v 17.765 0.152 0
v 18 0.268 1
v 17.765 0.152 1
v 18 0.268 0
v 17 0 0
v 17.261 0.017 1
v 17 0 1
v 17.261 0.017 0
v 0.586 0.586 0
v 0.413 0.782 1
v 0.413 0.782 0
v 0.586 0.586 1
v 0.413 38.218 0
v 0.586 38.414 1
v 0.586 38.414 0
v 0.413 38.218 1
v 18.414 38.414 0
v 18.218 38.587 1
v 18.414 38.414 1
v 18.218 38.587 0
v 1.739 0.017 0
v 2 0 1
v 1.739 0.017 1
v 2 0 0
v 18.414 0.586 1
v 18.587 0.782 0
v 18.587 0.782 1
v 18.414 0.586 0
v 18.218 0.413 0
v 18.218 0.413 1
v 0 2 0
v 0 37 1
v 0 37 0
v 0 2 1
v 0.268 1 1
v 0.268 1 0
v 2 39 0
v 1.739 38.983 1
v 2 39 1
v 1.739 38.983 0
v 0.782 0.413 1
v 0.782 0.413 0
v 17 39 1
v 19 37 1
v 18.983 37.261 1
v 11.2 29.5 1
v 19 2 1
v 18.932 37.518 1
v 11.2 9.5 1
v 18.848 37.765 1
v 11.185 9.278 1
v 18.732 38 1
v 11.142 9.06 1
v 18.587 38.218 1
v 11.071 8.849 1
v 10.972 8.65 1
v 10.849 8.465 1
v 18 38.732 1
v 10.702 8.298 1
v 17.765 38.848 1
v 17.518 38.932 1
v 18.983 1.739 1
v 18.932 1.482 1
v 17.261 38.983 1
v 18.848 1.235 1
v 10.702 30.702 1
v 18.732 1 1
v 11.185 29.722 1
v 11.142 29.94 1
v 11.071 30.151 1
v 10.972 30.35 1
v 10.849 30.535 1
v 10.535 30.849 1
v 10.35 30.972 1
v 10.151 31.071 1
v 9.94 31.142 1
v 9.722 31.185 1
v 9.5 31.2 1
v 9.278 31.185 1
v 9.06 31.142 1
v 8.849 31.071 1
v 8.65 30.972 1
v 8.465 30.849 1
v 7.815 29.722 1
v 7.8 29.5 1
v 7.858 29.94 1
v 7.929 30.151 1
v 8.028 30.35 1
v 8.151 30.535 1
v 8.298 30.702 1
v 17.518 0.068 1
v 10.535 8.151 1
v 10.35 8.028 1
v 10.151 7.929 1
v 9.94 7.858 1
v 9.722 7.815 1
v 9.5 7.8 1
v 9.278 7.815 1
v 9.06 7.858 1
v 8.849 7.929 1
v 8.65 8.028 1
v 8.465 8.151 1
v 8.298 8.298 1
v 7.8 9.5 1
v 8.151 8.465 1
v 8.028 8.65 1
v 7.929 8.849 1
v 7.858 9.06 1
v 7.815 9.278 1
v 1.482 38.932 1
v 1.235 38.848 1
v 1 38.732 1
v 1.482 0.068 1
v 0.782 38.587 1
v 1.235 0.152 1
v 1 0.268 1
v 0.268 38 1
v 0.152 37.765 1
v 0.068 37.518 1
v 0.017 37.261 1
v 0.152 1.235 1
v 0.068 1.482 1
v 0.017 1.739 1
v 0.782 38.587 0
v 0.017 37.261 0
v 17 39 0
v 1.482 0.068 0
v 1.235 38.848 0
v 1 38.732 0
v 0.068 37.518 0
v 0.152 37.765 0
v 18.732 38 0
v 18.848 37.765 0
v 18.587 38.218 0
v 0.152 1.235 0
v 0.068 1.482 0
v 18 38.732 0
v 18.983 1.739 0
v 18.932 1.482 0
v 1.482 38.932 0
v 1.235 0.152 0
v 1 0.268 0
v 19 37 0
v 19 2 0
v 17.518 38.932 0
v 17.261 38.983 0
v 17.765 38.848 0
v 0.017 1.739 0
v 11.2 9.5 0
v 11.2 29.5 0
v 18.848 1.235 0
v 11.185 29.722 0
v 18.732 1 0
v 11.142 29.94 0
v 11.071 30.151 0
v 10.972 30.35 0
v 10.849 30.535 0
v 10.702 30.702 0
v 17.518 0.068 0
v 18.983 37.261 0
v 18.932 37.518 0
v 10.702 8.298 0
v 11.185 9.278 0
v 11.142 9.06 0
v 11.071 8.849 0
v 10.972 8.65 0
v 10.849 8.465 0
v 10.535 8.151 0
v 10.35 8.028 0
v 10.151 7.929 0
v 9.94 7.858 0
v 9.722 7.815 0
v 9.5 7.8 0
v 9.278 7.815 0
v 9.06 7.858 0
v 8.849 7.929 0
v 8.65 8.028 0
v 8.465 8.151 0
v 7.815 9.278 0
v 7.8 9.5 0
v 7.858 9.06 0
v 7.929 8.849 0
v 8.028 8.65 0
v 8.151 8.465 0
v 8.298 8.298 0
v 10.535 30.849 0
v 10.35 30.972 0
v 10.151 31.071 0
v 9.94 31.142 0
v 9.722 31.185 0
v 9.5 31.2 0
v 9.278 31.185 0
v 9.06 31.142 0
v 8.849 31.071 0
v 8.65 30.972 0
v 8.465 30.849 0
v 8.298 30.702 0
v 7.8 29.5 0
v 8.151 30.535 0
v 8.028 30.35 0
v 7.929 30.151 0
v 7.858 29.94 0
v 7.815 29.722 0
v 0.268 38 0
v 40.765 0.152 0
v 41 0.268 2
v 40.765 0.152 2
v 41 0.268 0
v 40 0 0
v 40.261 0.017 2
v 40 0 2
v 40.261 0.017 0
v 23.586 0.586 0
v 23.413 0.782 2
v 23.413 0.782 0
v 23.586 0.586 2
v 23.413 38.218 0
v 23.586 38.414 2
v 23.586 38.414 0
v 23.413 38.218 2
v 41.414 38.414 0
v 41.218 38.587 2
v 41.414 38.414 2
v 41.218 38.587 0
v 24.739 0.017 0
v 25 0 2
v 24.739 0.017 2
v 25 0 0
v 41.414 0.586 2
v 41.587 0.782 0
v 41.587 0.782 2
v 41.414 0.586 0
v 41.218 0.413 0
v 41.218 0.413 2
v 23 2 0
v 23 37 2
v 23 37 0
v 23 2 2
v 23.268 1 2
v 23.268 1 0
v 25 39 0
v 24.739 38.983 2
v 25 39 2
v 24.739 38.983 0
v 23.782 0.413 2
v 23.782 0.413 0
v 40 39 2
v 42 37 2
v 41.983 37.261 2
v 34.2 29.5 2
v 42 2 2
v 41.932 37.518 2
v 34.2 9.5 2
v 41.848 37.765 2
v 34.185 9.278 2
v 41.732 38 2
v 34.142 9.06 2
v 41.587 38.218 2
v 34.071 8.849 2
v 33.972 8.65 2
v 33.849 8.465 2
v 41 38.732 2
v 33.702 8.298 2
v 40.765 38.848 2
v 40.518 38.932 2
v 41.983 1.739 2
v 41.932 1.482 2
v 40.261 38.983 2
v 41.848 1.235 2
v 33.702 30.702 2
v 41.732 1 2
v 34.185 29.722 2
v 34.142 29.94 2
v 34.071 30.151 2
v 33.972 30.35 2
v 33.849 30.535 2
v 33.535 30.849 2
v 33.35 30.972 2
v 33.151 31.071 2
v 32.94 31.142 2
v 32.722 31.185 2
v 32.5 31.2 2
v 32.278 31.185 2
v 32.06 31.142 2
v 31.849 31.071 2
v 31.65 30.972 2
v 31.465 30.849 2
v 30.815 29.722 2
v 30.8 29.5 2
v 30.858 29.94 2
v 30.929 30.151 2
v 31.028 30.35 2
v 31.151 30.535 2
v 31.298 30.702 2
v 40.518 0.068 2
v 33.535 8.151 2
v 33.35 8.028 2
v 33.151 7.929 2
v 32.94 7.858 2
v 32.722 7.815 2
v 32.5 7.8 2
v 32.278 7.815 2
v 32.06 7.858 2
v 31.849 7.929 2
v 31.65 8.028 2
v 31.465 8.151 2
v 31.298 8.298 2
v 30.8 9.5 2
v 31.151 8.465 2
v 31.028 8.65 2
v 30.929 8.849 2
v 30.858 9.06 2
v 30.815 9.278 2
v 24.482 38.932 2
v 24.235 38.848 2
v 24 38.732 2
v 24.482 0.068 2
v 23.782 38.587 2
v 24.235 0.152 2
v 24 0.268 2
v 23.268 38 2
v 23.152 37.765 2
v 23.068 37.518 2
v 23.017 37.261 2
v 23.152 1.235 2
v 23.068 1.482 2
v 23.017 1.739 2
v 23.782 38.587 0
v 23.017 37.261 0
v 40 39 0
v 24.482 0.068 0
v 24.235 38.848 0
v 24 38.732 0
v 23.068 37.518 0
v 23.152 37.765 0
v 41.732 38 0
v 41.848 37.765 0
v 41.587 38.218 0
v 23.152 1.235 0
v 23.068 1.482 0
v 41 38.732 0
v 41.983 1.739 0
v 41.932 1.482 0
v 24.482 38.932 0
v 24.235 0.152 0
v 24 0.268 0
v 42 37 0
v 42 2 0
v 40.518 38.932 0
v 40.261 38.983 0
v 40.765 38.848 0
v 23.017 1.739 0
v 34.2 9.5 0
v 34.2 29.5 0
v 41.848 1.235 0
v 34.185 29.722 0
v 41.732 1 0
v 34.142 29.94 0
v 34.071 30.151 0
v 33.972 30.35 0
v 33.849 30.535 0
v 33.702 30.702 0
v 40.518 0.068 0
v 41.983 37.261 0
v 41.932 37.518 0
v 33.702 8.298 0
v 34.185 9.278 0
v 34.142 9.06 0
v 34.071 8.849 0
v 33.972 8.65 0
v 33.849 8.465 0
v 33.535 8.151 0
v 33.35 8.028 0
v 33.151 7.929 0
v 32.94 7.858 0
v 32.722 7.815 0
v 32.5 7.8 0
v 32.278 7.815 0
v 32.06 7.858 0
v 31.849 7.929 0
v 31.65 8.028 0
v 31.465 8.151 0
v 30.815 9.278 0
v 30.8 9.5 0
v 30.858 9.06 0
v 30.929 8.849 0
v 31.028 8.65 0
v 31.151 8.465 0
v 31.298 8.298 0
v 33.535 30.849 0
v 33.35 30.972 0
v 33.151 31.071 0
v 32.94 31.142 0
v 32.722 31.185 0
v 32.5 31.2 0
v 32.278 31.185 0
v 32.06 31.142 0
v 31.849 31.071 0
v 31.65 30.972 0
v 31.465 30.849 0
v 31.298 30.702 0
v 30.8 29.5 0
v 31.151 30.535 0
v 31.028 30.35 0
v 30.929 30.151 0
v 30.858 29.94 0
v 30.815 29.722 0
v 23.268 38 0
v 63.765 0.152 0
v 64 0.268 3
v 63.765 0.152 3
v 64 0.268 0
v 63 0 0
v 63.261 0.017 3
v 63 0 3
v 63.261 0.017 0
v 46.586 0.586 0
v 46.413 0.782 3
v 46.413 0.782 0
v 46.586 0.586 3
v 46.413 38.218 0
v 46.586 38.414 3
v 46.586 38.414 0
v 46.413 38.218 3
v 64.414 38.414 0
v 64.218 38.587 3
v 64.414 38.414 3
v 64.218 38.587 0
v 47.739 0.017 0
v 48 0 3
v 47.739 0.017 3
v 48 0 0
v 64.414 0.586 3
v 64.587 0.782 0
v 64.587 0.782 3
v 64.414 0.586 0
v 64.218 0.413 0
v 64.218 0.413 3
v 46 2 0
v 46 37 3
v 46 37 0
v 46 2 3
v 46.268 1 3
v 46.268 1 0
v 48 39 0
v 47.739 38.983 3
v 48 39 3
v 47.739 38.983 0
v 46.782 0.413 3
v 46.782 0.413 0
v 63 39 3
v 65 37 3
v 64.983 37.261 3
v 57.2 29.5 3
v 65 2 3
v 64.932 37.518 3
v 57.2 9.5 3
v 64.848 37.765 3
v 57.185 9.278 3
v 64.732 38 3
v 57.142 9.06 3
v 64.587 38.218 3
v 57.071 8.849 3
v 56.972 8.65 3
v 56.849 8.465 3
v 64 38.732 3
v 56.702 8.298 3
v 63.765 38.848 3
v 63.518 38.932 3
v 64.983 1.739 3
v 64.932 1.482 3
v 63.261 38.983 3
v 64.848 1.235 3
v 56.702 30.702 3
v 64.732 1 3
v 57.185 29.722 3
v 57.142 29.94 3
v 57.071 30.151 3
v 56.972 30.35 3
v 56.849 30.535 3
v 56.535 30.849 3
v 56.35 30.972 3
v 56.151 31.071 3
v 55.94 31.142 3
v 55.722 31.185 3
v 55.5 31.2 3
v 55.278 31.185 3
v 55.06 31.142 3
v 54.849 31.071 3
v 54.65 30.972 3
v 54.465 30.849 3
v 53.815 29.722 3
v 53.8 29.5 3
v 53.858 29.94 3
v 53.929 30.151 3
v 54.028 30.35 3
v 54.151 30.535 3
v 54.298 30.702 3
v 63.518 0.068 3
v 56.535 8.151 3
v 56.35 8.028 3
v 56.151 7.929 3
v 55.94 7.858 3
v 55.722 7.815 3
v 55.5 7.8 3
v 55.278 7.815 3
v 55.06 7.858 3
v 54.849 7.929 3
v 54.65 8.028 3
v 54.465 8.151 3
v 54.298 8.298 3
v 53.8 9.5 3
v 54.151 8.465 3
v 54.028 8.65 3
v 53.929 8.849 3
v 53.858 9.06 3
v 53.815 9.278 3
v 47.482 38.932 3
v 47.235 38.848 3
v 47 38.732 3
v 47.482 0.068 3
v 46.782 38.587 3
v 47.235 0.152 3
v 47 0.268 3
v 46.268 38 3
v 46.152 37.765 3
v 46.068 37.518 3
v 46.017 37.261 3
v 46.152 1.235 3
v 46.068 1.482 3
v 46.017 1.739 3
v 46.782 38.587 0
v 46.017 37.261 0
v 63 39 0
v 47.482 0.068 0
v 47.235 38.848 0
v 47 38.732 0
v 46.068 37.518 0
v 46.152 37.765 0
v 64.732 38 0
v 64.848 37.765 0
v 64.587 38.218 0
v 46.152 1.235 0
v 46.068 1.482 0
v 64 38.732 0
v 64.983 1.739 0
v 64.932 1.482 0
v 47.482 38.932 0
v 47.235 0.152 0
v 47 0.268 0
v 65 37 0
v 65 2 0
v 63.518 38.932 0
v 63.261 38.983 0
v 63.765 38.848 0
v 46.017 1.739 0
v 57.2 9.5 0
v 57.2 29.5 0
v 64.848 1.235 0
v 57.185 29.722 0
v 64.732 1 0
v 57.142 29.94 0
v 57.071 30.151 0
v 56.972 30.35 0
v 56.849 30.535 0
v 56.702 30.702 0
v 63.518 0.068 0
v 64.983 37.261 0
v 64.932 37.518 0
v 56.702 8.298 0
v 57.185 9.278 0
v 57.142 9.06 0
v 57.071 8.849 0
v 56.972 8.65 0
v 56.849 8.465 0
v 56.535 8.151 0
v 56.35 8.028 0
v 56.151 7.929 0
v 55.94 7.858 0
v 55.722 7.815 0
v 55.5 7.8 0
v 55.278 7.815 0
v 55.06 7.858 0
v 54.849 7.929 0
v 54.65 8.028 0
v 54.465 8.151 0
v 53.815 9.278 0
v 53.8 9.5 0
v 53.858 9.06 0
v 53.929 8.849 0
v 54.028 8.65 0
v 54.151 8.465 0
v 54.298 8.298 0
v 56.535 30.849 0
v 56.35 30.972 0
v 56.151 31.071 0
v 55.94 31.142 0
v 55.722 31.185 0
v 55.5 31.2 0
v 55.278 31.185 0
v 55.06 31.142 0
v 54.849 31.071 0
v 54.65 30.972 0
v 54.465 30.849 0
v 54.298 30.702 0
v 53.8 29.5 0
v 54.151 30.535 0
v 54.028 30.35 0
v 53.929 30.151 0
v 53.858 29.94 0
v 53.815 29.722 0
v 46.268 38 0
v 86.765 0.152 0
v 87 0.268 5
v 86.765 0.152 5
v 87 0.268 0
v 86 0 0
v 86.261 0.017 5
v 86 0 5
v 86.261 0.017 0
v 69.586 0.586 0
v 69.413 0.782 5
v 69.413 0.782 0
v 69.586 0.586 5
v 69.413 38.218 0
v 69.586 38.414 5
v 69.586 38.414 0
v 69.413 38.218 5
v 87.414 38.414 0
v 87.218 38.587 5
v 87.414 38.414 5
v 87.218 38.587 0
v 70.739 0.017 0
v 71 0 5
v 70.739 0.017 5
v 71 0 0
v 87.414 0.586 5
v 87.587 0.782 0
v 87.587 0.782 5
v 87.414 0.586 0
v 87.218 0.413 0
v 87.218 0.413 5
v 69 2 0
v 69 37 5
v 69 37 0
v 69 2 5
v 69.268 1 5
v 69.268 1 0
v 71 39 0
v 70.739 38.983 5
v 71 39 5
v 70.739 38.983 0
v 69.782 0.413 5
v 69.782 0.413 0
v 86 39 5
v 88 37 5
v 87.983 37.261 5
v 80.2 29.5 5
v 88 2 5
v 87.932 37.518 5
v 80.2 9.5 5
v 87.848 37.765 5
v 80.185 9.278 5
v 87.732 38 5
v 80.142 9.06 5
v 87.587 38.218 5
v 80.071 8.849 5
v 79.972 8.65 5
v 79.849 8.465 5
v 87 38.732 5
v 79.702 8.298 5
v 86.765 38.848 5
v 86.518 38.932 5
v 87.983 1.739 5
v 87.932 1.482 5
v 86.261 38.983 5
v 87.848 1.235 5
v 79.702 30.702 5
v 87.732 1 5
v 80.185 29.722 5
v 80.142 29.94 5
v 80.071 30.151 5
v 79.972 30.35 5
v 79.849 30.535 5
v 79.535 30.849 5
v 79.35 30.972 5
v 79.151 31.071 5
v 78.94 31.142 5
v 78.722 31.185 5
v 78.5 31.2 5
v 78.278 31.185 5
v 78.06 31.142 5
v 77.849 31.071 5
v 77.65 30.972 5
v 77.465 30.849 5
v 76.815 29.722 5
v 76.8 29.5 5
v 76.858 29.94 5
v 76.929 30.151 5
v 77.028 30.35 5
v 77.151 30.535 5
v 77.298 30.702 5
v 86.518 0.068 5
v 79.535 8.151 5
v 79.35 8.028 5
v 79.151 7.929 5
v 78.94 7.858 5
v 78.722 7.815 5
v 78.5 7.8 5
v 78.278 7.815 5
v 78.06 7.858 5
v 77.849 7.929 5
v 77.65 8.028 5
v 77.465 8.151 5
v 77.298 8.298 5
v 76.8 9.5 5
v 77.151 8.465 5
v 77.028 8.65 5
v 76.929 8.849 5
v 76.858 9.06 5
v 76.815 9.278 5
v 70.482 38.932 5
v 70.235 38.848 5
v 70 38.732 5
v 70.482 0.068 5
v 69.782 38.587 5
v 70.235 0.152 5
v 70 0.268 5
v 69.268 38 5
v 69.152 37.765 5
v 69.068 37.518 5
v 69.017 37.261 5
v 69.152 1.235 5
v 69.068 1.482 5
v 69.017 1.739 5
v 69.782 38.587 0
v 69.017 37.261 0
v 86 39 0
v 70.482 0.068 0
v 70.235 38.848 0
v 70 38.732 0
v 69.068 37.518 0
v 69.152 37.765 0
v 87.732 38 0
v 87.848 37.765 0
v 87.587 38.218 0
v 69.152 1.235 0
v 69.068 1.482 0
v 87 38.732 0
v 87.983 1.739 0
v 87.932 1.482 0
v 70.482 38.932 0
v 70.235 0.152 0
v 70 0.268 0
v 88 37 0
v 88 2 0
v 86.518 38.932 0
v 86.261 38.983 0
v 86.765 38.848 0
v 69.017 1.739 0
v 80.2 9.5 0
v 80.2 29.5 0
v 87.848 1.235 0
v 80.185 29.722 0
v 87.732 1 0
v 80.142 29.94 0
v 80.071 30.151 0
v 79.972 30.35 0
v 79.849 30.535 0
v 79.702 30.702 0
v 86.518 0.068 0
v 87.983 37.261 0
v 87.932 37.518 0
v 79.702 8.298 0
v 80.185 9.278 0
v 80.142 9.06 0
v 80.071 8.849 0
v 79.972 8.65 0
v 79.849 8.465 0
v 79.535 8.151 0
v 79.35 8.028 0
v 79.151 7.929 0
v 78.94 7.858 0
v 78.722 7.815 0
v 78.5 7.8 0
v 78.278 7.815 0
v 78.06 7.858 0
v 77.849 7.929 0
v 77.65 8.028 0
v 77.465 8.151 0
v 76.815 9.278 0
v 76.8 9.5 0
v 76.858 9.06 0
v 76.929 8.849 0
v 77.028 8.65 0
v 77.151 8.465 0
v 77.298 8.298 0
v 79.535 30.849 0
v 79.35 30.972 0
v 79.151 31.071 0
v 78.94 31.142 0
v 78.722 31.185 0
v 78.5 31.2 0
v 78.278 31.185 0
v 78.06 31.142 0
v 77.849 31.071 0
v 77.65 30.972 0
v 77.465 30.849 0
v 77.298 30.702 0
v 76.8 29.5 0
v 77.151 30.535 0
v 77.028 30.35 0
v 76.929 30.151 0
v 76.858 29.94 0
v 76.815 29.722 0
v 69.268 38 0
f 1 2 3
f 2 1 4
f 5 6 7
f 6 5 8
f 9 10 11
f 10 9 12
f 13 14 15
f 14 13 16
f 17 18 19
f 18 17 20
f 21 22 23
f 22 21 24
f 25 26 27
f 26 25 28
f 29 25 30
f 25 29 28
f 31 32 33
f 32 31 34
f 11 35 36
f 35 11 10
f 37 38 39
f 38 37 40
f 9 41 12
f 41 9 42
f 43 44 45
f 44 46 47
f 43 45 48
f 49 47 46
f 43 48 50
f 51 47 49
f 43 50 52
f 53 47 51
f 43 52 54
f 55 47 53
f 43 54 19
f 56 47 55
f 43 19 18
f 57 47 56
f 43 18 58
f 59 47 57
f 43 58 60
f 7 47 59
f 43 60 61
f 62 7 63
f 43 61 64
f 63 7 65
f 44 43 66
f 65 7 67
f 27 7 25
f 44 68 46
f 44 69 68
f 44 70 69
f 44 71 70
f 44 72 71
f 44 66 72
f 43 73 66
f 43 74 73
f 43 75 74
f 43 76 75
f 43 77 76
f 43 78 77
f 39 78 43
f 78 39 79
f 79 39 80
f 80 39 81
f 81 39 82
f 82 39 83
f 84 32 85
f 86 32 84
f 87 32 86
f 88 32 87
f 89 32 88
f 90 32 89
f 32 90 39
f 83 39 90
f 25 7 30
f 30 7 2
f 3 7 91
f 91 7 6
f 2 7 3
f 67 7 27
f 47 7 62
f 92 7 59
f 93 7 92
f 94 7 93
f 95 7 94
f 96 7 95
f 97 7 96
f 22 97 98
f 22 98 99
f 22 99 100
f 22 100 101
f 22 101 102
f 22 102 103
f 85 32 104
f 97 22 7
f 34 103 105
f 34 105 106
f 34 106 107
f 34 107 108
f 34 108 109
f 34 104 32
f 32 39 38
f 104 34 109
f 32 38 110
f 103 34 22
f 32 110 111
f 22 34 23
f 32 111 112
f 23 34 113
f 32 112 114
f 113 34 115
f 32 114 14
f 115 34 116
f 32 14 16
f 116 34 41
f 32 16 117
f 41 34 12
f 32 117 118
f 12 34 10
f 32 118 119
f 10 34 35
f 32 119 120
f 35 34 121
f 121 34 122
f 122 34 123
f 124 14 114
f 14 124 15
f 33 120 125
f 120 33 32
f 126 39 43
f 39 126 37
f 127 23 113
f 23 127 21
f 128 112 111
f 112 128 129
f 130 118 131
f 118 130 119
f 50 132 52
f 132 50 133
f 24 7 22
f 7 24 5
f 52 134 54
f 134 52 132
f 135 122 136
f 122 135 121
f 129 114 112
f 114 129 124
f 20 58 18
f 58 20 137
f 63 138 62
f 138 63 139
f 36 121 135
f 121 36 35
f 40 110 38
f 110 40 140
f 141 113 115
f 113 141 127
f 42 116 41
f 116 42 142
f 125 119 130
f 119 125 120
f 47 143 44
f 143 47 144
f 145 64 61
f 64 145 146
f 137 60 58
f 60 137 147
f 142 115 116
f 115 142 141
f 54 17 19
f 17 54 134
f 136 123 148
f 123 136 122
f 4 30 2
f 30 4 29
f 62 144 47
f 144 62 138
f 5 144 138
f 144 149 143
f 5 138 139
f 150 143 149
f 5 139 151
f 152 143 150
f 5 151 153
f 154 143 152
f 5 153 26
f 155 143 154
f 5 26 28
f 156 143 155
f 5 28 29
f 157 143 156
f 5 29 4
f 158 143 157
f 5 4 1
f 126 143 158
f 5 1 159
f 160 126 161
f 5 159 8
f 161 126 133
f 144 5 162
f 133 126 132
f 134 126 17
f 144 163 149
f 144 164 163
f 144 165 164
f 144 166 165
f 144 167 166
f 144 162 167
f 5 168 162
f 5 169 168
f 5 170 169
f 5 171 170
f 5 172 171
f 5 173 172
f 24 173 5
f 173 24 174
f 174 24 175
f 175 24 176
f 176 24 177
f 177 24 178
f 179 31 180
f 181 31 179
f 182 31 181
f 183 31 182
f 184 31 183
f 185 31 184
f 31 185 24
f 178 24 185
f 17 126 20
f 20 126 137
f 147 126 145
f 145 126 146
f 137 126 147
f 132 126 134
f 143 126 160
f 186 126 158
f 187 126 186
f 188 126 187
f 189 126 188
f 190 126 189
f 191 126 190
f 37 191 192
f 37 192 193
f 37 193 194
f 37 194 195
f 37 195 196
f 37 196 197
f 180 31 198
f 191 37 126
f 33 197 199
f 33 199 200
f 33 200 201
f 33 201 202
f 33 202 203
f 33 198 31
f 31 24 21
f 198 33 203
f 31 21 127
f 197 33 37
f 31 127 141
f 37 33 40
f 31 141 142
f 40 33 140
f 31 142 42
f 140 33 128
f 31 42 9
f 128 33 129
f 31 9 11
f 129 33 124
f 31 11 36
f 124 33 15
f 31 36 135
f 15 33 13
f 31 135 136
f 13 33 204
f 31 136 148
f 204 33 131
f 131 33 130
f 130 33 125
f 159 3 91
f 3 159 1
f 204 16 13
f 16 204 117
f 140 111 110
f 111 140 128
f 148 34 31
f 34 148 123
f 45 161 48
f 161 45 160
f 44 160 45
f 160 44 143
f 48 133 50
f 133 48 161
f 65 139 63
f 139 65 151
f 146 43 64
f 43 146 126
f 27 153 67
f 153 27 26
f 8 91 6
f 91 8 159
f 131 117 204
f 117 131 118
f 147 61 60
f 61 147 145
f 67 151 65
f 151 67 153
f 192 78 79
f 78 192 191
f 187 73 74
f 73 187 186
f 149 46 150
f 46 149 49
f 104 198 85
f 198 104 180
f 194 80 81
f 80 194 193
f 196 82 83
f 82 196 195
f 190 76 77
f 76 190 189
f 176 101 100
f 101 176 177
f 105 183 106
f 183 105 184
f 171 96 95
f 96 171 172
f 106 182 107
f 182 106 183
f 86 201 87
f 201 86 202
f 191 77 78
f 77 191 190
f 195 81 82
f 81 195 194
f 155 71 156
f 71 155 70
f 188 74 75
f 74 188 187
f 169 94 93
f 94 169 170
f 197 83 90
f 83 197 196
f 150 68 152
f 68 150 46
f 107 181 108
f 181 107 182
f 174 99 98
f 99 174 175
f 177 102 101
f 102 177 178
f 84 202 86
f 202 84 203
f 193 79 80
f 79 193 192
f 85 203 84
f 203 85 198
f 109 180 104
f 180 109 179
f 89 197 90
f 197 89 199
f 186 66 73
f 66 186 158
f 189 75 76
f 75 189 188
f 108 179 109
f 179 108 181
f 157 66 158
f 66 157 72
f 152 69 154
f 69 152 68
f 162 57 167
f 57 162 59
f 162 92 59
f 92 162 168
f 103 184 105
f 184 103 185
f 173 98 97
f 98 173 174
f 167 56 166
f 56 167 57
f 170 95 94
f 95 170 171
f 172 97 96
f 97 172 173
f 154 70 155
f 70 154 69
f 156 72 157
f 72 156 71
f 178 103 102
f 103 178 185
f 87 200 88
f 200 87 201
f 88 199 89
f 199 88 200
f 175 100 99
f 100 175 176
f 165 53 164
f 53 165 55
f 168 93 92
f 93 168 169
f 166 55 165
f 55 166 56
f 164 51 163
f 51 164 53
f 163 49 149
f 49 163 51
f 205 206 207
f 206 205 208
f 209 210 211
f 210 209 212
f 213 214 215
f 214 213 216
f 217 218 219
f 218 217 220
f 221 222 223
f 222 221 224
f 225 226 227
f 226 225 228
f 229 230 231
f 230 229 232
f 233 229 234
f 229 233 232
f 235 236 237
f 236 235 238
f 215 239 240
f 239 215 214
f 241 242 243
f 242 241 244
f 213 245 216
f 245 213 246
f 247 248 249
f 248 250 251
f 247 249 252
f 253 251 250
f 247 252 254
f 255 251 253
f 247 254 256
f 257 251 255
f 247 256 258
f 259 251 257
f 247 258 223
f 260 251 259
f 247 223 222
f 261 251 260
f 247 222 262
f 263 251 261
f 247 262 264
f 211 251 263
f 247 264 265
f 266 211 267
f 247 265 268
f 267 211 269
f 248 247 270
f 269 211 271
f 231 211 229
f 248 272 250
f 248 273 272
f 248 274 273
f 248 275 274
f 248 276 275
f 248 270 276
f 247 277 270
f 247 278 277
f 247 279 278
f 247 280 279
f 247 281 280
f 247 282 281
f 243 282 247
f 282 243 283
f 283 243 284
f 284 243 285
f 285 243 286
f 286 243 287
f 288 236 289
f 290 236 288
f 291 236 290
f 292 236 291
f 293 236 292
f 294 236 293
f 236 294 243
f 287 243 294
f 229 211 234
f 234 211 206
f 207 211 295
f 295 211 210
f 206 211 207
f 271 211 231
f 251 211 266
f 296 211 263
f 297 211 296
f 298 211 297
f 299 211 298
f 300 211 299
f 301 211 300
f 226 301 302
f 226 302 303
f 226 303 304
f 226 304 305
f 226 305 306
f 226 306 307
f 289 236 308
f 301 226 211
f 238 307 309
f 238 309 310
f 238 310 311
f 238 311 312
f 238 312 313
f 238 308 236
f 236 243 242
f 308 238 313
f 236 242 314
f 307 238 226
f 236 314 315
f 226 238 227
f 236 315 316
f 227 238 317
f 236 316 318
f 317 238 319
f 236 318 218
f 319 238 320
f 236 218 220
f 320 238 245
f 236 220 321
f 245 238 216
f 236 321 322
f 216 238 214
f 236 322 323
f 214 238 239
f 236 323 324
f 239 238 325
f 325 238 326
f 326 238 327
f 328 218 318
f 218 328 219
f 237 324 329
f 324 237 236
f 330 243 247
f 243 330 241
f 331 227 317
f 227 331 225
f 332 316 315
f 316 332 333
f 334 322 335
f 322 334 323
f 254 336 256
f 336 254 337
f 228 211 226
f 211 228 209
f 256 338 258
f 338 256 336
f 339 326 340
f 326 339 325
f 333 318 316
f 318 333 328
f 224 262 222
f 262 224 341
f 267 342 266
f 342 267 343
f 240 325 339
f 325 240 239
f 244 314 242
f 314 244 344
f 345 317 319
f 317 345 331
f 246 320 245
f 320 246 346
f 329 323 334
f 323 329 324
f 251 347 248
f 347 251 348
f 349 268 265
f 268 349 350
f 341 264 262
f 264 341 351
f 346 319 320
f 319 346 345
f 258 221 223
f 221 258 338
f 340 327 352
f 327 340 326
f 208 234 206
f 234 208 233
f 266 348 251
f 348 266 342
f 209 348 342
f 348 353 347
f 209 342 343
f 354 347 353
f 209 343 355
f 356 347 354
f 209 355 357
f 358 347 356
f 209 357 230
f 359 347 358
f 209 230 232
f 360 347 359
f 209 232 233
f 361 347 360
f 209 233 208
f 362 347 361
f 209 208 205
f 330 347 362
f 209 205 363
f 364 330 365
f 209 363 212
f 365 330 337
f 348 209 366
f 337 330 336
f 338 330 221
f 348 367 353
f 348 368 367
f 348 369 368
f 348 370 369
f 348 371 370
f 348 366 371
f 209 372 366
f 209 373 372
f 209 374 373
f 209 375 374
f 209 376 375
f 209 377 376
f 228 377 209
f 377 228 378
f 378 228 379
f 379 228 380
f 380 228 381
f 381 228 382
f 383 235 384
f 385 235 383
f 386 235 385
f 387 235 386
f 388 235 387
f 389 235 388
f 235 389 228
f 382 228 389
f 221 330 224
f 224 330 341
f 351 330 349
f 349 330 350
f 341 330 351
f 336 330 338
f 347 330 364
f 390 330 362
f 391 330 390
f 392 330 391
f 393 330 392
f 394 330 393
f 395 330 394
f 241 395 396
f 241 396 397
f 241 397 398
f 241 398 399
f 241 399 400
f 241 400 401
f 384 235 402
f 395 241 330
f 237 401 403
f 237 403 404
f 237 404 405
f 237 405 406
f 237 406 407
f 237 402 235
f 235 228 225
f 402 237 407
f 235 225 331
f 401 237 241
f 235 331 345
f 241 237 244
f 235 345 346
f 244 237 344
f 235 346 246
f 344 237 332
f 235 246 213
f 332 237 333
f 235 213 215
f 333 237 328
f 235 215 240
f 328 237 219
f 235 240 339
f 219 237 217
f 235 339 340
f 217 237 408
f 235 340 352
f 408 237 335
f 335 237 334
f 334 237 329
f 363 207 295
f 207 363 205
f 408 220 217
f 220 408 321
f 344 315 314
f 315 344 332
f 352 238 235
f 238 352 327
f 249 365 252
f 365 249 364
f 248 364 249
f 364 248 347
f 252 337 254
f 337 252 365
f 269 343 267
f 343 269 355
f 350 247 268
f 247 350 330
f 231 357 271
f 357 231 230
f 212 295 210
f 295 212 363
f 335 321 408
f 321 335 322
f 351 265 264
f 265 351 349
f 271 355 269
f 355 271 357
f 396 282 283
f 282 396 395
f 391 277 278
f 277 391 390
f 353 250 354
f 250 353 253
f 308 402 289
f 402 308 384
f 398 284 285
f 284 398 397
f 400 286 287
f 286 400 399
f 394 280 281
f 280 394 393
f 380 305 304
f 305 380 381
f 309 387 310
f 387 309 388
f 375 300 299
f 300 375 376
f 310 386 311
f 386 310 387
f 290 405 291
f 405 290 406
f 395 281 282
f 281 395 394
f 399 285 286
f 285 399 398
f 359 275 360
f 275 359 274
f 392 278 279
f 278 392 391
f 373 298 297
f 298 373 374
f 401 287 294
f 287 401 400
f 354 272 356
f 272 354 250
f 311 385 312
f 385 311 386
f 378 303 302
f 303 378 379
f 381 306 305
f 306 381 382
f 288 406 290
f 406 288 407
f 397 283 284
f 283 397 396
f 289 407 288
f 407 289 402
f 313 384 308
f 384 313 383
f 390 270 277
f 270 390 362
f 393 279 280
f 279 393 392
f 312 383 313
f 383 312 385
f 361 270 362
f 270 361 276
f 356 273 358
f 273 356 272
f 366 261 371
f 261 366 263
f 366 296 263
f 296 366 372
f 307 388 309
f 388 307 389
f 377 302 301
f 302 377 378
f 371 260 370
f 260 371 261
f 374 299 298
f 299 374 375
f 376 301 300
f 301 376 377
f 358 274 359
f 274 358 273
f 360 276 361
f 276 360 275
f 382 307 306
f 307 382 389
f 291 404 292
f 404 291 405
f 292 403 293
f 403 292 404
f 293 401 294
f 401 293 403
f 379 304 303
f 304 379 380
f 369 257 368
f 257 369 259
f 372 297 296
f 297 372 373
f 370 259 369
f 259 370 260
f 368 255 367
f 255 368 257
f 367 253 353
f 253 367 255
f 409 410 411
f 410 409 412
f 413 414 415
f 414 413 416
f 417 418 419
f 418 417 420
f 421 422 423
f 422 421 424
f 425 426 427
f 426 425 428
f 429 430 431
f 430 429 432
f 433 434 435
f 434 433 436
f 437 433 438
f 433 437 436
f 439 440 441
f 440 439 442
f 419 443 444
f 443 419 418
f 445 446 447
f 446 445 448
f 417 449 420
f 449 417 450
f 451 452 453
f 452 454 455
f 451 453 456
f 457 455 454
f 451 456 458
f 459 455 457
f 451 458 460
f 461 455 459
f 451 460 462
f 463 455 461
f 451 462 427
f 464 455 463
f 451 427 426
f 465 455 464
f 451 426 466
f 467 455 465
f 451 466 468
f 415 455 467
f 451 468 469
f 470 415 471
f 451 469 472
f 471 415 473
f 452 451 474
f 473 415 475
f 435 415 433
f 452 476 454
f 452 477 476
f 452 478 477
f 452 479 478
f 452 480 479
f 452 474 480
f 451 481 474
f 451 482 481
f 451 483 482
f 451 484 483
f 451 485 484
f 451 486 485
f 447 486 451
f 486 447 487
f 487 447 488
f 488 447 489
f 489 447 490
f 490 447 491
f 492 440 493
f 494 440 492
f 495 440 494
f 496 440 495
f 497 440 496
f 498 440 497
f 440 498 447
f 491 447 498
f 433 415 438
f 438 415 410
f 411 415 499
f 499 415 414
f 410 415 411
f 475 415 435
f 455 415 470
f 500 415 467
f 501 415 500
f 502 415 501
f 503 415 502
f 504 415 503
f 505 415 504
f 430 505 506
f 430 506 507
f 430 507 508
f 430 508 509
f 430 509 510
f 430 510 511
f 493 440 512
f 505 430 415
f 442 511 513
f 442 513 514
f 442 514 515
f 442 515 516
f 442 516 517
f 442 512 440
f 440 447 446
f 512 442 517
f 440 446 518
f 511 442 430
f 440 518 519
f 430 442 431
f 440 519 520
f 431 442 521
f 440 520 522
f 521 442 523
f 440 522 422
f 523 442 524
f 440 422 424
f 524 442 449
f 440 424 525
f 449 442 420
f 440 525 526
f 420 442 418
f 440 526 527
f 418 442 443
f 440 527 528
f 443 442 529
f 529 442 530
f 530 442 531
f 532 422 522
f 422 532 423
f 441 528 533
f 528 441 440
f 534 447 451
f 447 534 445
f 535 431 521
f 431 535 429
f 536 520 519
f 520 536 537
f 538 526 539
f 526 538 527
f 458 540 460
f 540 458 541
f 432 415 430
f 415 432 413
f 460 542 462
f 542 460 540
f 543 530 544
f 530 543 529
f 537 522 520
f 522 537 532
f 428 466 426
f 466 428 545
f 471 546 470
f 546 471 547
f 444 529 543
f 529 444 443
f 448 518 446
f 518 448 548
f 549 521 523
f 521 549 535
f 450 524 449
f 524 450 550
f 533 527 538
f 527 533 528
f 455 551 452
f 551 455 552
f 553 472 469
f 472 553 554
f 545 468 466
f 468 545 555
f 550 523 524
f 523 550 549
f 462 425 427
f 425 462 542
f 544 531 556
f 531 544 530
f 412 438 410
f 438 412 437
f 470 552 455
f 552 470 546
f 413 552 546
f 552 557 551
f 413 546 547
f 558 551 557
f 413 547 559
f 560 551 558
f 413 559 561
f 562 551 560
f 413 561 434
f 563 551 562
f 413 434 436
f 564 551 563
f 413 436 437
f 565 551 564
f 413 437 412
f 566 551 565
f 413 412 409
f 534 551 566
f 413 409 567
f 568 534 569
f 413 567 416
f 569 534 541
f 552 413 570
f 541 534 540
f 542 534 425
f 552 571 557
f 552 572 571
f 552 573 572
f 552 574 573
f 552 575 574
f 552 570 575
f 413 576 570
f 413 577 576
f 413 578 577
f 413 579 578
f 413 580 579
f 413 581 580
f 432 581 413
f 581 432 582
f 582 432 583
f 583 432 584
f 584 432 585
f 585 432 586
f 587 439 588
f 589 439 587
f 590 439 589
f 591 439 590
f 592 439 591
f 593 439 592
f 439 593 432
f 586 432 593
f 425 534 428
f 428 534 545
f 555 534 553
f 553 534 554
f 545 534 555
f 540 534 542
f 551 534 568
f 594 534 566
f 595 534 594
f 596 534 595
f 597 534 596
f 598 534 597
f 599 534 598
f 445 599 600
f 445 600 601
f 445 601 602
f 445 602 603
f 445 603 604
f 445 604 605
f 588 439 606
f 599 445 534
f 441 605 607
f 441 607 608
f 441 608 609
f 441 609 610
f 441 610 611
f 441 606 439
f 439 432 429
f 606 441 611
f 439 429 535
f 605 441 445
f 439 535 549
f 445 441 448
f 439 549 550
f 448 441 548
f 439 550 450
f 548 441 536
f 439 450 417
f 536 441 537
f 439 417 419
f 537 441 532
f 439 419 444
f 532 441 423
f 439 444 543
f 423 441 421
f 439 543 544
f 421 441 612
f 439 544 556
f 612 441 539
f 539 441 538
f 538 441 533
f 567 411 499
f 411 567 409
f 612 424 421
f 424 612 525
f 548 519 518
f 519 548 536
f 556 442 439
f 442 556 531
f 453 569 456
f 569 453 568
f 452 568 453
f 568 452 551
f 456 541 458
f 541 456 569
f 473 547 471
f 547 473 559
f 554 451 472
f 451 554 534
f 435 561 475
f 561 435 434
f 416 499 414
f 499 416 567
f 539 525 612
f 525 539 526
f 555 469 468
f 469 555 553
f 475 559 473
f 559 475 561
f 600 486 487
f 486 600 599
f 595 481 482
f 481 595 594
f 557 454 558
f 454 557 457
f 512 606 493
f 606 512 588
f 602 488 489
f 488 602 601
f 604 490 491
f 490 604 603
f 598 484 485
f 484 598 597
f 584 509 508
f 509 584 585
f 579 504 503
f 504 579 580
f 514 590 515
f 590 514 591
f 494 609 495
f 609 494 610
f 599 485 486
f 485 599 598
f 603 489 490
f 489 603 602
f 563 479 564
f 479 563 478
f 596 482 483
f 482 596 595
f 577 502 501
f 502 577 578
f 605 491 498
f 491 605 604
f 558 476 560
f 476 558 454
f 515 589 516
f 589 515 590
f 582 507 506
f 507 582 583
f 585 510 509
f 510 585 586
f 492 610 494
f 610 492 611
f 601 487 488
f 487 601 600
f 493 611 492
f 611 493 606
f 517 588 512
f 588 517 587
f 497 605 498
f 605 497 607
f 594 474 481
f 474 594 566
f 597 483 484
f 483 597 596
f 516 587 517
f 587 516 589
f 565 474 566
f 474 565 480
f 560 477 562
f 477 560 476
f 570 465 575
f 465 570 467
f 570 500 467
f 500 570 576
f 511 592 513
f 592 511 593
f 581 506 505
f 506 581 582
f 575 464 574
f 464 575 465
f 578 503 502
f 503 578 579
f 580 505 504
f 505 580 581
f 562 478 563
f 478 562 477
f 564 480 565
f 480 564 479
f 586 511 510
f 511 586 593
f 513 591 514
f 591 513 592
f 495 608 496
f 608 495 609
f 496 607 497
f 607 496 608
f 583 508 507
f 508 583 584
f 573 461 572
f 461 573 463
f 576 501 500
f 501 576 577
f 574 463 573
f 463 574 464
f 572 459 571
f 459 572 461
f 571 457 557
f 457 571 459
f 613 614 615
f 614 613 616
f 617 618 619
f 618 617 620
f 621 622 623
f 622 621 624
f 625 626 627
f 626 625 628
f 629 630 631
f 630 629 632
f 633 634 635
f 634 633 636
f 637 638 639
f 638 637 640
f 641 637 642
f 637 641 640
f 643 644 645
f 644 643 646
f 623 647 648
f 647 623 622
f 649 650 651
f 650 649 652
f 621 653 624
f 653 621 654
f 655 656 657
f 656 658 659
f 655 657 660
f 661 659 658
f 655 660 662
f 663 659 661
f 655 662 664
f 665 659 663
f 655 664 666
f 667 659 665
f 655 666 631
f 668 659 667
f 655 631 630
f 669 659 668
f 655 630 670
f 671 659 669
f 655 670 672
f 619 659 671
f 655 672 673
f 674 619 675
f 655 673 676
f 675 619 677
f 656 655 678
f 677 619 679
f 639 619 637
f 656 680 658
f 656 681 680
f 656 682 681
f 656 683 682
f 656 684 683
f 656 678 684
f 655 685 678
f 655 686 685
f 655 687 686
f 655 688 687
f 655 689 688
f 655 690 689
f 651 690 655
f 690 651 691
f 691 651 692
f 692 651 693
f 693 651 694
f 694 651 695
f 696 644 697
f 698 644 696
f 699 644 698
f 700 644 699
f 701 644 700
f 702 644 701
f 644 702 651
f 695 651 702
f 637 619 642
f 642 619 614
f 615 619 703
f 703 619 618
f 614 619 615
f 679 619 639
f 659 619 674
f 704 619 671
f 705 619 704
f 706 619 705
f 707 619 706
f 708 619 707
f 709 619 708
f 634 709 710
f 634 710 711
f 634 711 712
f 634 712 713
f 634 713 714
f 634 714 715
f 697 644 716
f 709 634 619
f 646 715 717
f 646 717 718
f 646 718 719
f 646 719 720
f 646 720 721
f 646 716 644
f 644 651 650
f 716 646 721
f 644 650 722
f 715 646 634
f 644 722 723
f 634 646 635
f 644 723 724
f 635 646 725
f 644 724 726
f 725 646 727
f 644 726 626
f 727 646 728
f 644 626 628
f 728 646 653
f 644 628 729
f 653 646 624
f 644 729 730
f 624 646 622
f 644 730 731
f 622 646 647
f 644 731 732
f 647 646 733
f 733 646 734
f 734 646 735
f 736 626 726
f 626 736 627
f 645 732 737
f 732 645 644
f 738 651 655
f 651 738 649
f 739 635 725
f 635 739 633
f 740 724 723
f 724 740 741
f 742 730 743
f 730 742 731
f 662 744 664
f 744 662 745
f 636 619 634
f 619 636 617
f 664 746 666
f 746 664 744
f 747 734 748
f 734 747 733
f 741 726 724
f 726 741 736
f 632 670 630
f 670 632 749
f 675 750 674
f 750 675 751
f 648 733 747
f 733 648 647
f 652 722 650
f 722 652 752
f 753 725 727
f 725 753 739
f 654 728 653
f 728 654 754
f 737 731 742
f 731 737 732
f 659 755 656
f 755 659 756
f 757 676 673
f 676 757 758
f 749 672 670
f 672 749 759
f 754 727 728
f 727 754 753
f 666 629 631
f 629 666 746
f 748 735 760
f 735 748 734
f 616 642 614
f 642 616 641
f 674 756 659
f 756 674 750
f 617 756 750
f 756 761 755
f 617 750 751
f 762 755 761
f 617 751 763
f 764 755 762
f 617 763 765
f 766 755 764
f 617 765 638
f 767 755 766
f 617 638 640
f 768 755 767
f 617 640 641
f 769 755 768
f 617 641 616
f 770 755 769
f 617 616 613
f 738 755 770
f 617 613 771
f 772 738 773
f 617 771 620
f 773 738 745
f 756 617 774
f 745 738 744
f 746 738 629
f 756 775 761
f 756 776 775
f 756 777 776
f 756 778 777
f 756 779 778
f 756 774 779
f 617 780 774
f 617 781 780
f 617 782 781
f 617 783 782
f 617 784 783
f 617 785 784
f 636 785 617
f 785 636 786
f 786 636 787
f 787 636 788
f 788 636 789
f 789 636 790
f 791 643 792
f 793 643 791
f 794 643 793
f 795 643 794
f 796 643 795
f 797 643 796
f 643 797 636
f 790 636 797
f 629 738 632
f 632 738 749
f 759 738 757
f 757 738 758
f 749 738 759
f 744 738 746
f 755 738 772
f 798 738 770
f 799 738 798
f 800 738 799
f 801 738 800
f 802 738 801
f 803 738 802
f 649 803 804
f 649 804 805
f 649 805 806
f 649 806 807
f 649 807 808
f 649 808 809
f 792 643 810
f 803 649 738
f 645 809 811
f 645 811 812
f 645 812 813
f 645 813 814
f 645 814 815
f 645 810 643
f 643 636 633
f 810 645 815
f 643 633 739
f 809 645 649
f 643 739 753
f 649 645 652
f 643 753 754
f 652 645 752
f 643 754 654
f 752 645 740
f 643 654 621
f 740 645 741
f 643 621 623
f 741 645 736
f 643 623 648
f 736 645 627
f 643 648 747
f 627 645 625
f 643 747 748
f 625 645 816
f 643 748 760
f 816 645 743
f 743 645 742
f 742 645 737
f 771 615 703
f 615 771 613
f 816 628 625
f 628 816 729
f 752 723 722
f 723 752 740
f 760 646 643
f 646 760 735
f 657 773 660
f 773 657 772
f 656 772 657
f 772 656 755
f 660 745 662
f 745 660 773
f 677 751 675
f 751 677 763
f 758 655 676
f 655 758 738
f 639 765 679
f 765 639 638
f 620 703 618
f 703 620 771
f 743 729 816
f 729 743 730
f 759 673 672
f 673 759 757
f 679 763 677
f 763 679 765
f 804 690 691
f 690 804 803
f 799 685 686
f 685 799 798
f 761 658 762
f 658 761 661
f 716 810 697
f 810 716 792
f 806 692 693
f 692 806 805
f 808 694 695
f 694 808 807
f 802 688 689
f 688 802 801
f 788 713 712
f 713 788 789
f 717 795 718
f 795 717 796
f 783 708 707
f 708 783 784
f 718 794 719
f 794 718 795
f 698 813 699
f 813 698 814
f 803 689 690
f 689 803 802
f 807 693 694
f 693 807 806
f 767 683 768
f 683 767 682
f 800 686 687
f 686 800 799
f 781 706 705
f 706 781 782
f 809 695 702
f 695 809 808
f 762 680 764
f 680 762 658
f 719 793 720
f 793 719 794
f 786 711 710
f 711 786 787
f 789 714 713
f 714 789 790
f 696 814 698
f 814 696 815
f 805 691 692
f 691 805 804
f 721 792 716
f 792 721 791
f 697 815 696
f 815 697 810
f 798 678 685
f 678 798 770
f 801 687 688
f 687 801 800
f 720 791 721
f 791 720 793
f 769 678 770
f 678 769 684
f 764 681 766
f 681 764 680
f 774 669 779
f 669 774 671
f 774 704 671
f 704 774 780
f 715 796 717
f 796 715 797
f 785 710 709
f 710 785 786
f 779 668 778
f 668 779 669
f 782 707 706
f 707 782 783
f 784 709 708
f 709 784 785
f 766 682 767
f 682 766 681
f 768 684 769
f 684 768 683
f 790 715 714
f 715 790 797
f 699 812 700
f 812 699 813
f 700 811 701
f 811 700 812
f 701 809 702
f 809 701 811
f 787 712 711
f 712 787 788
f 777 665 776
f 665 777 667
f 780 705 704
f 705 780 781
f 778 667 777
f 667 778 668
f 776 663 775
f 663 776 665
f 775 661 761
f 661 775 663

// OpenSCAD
// file: bugout.scad
// bugout.scad - shared library for the Bugout SDR mounting system.
//
// Everything mounts on a 20 mm grid of M3 holes. Base tiles carry captive
// M3 nuts underneath, so any bracket with grid-spaced slots can be bolted
// anywhere on the floor with M3 x 8-12 mm screws.
//
// Include this from part files with:  include <bugout.scad>

$fn = 48;

// ---- Grid and hardware ---------------------------------------------------
PITCH      = 20;     // grid spacing, mm
M3_CLEAR   = 3.4;    // M3 clearance hole
M3_HEAD_D  = 6.2;    // M3 socket head counterbore
M3_HEAD_H  = 3.2;
M3_NUT_AF  = 5.7;    // M3 nut across flats, with print clearance
M3_NUT_H   = 2.6;
M3_INSERT  = 4.2;    // hole for M3 heat-set insert (if you prefer inserts)

// ---- Printing ------------------------------------------------------------
WALL   = 2.4;        // default wall, a multiple of a 0.4 nozzle
CHAMF  = 0.8;        // edge chamfer

// ---- Helpers -------------------------------------------------------------

// Hexagon prism for a nut trap, flats aligned with X.
module nut_trap(h = M3_NUT_H, af = M3_NUT_AF) {
    cylinder(d = af / cos(30), h = h, $fn = 6);
}

// Through hole for M3, optionally with counterbore at the top (z = h).
module m3_hole(h, counterbore = false) {
    translate([0, 0, -0.01]) cylinder(d = M3_CLEAR, h = h + 0.02);
    if (counterbore)
        translate([0, 0, h - M3_HEAD_H]) cylinder(d = M3_HEAD_D, h = M3_HEAD_H + 0.01);
}

// Slot of length len (centre to centre) along X, for M3.
module m3_slot(len, h, d = M3_CLEAR) {
    translate([0, 0, -0.01]) hull() {
        cylinder(d = d, h = h + 0.02);
        translate([len, 0, 0]) cylinder(d = d, h = h + 0.02);
    }
}

// Rounded rectangle plate, corner radius r, origin at the corner.
module rplate(w, d, h, r = 3) {
    r2 = min(r, w / 2 - 0.01, d / 2 - 0.01);
    translate([r2, r2, 0]) linear_extrude(h)
        offset(r = r2) square([w - 2 * r2, d - 2 * r2]);
}

// Grid of points, nx by ny, starting at (x0, y0).
module grid(nx, ny, x0 = 0, y0 = 0, p = PITCH) {
    for (i = [0 : nx - 1], j = [0 : ny - 1])
        translate([x0 + i * p, y0 + j * p, 0]) children();
}

// Mounting foot: a plate with M3 slots on the grid, so any part can be
// bolted down and slid up to one pitch along X. Footprint nx x ny cells.
// With counterbore = true the screw heads sit flush with the top (h >= 6),
// so a battery or dongle can sit directly on the foot.
module grid_foot(nx, ny, h = 4, counterbore = false) {
    difference() {
        rplate(nx * PITCH, ny * PITCH, h);
        for (j = [0 : ny - 1])
            translate([PITCH / 2, PITCH / 2 + j * PITCH, 0]) {
                m3_slot((nx - 1) * PITCH, h);
                if (counterbore)
                    translate([0, 0, h - M3_HEAD_H])
                        m3_slot((nx - 1) * PITCH, M3_HEAD_H, M3_HEAD_D);
            }
    }
}

// Velcro / strap slot through a wall, slot width sw, height sh.
module strap_slot(sw = 22, sh = 3, depth = 20) {
    translate([-sw / 2, -depth / 2, 0]) cube([sw, depth, sh]);
}
// main file
// shims.scad - spacers, wedges and wall jacks for taking up slack.
//
// PART = "spacers": flat 1 x 2 cell spacers in 1, 2, 3 and 5 mm, slotted
//                   for M3, to lift a bracket or level a tile.
// PART = "wedges":  tapered wedges to pack between the floor tiles and the
//                   case walls (moulded cases have 1-3 degree draft).
// PART = "jack":    a wall jack: bolts to the grid at the edge of the floor
//                   and an M3 screw pushes a pad against the case wall, so
//                   the floor locks in without glue or holes in the case.
// Print flat. TPU works well for the wedges and jack pads.

include <bugout.scad>

PART = "spacers";

SPACER_T = [1, 2, 3, 5];
WEDGE_L  = 40;
WEDGE_W  = 15;
WEDGE_SIZES = [[1, 4], [2, 6], [3, 8]];   // [thin end, thick end]

module spacer(t) {
    difference() {
        rplate(PITCH - 1, 2 * PITCH - 1, t, 2);
        translate([(PITCH - 1) / 2, PITCH / 2 - 0.5, 0]) rotate(90) m3_slot(PITCH, t);
    }
}

module wedge(t0, t1) {
    difference() {
        rotate([90, 0, 0]) translate([0, 0, -WEDGE_W])
            linear_extrude(WEDGE_W) polygon([[0, 0], [WEDGE_L, 0], [WEDGE_L, t1], [0, t0]]);
        // finger pull hole at the thick end
        translate([WEDGE_L - 6, WEDGE_W / 2, -0.01]) cylinder(d = 4, h = t1 + 1);
    }
}

module wall_jack() {
    H = 14;
    difference() {
        union() {
            grid_foot(1, 2, 5);
            cube([PITCH, 8, H]);
        }
        // horizontal M3 pointing at the wall (-Y), nut trapped inside
        translate([PITCH / 2, 9, H / 2 + 1.5]) rotate([90, 0, 0]) cylinder(d = M3_CLEAR, h = 10);
        translate([PITCH / 2 - M3_NUT_AF / 2, 3, H / 2 + 1.5 - M3_NUT_AF / 2 / cos(30)])
            cube([M3_NUT_AF, M3_NUT_H + 0.3, H]);
    }
}

// Pad that snaps over the jack screw tip so it doesn't mark the case.
module jack_pad() {
    difference() {
        cylinder(d = 12, h = 4);
        translate([0, 0, 1.5]) cylinder(d = 2.9, h = 3);
    }
}

if (PART == "spacers")
    for (i = [0 : len(SPACER_T) - 1])
        translate([i * (PITCH + 3), 0, 0]) spacer(SPACER_T[i]);
if (PART == "wedges")
    for (i = [0 : len(WEDGE_SIZES) - 1])
        translate([0, i * (WEDGE_W + 3), 0]) wedge(WEDGE_SIZES[i][0], WEDGE_SIZES[i][1]);
if (PART == "jack") {
    wall_jack();
    translate([PITCH + 12, 10, 0]) jack_pad();
}
